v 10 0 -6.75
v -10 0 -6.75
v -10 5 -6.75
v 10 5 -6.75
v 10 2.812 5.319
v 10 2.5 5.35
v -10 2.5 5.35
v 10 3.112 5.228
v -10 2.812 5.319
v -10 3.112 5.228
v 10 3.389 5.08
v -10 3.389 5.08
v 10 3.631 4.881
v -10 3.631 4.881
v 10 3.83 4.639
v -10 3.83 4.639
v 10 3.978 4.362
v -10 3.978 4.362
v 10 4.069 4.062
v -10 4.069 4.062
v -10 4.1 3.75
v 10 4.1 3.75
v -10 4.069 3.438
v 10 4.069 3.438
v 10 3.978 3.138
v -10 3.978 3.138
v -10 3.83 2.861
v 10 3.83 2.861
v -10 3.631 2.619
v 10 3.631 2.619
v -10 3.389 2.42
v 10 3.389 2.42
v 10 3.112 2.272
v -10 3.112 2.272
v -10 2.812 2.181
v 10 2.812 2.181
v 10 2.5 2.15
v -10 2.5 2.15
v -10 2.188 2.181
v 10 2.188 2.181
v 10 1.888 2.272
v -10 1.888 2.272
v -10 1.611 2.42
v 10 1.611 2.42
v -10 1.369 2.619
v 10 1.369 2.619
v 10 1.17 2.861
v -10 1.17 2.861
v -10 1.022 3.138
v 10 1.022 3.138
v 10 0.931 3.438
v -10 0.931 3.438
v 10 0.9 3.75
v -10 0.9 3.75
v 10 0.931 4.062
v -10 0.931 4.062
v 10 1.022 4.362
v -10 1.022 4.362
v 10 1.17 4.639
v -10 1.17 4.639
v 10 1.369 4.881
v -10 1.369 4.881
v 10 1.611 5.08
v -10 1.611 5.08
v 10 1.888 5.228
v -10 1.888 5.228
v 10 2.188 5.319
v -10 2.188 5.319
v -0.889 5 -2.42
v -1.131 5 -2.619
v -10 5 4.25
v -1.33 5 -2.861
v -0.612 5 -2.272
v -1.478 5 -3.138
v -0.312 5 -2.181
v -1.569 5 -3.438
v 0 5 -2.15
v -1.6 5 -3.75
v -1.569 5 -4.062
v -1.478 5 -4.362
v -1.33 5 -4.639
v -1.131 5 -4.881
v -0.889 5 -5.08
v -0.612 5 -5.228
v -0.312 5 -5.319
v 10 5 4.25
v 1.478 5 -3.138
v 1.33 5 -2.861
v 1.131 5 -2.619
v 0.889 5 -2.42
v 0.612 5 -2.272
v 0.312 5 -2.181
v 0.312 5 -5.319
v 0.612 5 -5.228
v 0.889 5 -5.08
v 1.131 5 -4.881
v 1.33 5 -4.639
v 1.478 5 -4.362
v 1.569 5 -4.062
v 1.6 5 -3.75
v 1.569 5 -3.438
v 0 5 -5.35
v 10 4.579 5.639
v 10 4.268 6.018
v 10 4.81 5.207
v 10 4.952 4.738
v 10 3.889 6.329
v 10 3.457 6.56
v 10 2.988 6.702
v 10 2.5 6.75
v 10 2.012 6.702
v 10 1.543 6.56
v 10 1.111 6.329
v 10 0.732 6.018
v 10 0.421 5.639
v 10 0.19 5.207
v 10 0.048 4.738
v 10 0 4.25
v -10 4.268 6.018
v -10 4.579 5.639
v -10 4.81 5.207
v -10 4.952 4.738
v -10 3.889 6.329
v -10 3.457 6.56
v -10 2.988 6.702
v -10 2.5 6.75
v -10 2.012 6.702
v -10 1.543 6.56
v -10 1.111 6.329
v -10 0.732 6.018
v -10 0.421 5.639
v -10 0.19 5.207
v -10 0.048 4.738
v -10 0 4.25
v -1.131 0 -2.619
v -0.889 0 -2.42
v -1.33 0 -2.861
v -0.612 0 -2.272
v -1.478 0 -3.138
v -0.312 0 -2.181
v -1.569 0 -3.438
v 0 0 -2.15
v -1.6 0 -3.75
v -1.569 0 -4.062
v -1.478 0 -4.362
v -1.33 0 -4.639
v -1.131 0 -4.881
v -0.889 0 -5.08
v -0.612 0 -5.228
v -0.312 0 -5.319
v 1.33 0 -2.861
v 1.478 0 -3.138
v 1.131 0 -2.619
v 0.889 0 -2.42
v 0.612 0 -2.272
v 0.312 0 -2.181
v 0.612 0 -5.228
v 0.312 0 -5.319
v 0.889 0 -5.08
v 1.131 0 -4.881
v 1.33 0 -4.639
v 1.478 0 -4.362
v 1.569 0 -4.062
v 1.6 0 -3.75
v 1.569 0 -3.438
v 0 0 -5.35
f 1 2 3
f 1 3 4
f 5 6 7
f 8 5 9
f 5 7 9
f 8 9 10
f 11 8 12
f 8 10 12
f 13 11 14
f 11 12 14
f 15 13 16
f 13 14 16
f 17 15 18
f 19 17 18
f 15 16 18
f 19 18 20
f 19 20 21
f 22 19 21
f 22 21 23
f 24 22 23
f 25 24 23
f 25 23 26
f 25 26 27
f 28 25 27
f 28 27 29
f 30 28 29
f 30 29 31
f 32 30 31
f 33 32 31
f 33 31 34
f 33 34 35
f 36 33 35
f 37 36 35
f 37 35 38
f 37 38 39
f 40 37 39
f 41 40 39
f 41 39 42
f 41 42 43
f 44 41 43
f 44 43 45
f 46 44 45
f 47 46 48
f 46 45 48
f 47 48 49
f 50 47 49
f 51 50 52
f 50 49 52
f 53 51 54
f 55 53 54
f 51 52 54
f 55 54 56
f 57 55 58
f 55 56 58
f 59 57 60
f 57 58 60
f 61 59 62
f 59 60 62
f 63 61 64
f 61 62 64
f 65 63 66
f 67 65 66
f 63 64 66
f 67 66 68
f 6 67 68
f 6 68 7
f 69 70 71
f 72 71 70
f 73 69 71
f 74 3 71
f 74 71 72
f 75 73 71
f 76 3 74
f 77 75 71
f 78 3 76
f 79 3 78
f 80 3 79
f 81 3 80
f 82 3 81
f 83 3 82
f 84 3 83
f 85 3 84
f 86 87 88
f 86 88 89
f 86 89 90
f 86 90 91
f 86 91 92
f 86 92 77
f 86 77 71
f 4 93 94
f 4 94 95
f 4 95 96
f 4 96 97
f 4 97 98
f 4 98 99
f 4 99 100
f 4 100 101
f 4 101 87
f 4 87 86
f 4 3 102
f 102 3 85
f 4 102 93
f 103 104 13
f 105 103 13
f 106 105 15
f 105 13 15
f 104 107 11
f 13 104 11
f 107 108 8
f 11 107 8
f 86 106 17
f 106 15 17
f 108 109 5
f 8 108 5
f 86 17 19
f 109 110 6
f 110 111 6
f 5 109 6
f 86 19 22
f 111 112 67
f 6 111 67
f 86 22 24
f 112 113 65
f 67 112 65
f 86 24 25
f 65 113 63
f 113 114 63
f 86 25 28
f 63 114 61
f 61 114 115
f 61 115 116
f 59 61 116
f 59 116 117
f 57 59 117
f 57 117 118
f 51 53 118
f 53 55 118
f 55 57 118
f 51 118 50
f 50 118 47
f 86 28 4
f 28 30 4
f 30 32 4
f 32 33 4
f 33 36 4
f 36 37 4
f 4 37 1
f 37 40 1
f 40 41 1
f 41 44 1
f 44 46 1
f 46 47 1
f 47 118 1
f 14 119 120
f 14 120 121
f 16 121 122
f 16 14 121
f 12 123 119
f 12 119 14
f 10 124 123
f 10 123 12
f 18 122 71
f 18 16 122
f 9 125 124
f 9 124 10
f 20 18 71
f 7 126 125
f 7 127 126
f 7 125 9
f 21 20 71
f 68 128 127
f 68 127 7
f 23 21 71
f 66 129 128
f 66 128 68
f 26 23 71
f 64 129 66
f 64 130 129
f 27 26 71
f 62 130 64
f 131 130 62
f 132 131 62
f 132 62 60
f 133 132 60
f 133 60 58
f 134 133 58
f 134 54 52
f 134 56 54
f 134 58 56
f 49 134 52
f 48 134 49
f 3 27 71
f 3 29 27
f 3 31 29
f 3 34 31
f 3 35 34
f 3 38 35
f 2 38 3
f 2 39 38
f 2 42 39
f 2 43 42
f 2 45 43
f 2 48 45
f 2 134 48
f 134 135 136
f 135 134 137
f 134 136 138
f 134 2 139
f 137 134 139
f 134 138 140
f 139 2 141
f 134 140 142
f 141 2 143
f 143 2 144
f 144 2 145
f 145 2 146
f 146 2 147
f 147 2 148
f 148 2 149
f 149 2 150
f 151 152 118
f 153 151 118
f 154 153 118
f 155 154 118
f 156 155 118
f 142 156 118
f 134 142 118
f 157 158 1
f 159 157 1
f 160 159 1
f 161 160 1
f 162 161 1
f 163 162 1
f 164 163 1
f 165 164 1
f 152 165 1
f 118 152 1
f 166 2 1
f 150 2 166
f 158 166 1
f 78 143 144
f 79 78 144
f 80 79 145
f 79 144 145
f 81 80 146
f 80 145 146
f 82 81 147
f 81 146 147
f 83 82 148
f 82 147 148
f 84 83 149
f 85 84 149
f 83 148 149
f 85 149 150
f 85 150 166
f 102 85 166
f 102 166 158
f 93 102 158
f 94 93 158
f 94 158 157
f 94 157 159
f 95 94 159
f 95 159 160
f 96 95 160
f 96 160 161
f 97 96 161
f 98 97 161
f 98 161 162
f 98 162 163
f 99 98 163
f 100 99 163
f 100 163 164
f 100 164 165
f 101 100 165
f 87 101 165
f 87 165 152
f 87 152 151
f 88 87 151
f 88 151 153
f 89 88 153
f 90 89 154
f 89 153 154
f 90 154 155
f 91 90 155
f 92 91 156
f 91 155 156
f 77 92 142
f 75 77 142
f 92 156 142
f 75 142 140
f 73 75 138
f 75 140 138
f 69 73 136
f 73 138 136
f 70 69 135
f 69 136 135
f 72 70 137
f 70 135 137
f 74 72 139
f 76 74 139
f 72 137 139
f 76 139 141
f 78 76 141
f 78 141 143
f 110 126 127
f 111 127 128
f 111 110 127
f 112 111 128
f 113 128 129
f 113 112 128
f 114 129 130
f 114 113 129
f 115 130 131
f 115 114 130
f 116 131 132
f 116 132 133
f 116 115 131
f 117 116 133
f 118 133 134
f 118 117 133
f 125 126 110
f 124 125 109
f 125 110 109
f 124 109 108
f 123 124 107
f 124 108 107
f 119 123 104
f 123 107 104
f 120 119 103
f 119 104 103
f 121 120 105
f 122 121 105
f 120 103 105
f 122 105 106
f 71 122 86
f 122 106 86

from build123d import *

# Parameters (mm, degrees)
SKETCH1_W                  = 20
SKETCH1_H                  = 13.5
BOSS_EXTRUDE1_DEPTH        = 5
F_3_2_3_2_M2_HEAT_SET_D    = 3.2
FILLET2_R                  = 2.5
F_3_2_3_2_DIAMETER_HOLE1_D = 3.2


with BuildPart() as part:
    # Sketch1 → Boss-Extrude1 (new body)
    with BuildSketch(Plane(origin=(0, 0, 0), x_dir=(1, 0, 0), z_dir=(0, 1, 0))):
        Rectangle(SKETCH1_W, SKETCH1_H)
    extrude(amount=BOSS_EXTRUDE1_DEPTH)

    # Ø3.2 (3.2) M2 heat set (through all)
    with Locations(Plane(origin=(0, 5, 0), x_dir=(1, 0, 0), z_dir=(0, 1, 0))):
        with Locations((0, 3.75)):
            Hole(F_3_2_3_2_M2_HEAT_SET_D / 2)

    # Fillet2
    fillet2_edges = [part.edges().sort_by_distance(p)[0] for p in [
        (0, 0, 6.75),
        (0, 5, 6.75),
    ]]
    fillet(fillet2_edges, radius=FILLET2_R - 0.0001)  # a hair under: the kernel refuses the full size

    # Ø3.2 (3.2) Diameter Hole1 (through all)
    with Locations(Plane(origin=(10, 0, 0), x_dir=(0, 0, -1), z_dir=(1, 0, 0))):
        with Locations((-3.75, 2.5)):
            Hole(F_3_2_3_2_DIAMETER_HOLE1_D / 2)


solid = part.part
